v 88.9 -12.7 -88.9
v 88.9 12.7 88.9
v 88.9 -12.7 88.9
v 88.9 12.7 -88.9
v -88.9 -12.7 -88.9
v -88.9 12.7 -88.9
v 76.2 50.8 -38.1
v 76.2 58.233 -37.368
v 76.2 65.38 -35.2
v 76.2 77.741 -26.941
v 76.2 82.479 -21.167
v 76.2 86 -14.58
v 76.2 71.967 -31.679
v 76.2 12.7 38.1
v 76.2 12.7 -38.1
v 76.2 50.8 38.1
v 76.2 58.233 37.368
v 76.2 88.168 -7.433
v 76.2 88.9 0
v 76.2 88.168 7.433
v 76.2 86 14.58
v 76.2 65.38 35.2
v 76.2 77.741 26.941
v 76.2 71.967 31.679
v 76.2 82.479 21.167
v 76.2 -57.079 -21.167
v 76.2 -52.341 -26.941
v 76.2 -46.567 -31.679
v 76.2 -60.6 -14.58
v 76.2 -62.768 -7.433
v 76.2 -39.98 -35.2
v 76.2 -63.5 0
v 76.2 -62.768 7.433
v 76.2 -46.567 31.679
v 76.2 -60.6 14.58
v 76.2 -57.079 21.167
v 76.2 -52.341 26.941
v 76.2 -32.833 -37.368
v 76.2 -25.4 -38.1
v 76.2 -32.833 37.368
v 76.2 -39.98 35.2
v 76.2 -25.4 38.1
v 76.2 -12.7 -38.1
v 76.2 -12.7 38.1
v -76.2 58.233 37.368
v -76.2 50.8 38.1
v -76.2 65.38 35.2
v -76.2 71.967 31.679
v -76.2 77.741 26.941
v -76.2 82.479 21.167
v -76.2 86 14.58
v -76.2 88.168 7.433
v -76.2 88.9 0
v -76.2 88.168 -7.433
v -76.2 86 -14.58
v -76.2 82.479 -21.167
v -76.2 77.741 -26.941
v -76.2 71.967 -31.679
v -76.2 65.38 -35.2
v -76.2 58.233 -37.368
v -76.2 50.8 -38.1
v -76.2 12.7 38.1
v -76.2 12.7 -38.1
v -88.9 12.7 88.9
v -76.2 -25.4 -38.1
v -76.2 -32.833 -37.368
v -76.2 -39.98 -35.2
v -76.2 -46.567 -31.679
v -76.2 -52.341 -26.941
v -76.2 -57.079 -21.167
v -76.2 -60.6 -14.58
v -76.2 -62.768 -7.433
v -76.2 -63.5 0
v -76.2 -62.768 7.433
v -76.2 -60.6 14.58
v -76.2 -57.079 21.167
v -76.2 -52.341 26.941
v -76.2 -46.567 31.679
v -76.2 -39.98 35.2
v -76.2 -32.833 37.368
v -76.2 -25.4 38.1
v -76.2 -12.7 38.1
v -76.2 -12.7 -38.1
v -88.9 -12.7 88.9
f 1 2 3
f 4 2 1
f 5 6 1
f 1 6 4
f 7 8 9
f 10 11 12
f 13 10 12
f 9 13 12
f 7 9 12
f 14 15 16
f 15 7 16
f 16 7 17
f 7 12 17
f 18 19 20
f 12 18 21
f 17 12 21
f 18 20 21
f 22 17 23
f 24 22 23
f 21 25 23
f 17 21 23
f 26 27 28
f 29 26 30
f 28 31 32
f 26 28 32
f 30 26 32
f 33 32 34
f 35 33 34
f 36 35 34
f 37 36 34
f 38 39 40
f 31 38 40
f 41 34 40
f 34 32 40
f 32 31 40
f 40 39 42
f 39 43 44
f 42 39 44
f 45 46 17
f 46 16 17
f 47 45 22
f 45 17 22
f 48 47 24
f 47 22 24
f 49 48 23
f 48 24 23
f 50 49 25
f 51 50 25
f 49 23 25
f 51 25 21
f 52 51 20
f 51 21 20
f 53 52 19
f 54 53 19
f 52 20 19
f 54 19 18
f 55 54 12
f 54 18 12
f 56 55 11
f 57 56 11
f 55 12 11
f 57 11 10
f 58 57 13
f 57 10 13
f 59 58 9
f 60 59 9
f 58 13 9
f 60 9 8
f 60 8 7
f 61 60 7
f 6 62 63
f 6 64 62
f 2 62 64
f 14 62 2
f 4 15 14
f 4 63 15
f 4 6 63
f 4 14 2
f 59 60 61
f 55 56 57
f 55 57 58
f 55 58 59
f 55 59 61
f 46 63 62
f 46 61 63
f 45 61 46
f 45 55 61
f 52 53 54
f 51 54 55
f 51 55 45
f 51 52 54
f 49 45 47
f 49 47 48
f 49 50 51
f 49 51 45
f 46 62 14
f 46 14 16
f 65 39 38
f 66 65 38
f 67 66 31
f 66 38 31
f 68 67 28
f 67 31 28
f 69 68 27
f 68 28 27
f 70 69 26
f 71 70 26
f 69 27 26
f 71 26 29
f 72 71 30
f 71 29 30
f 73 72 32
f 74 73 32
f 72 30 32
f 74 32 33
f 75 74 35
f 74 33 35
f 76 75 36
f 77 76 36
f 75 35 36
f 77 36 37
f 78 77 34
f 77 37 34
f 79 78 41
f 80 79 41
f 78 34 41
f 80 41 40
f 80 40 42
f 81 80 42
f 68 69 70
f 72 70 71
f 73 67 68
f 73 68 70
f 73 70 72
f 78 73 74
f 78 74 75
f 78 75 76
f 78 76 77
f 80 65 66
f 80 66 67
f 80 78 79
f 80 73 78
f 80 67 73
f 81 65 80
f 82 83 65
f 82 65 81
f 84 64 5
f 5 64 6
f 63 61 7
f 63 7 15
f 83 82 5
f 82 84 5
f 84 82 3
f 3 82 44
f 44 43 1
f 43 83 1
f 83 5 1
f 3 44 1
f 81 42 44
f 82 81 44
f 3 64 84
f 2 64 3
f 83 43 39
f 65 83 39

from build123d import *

# Parameters (mm, degrees)
SKETCH1_W           = 177.8
SKETCH1_H           = 177.8
BOSS_EXTRUDE1_DEPTH = 12.7
BOSS_EXTRUDE2_DEPTH = 76.2


with BuildPart() as part:
    # Sketch1 → Boss-Extrude1 (new, symmetric)
    with BuildSketch(Plane(origin=(0, 0, 0), x_dir=(1, 0, 0), z_dir=(0, 1, 0))):
        Rectangle(SKETCH1_W, SKETCH1_H)
    extrude(amount=BOSS_EXTRUDE1_DEPTH, both=True)

    # Sketch2 → Boss-Extrude2 (add, symmetric)
    with BuildSketch(Plane(origin=(0, 0, 0), x_dir=(0, 0, -1), z_dir=(1, 0, 0))):
        with BuildLine():
            Line((-38.1, -25.4), (-38.1, 50.8))
            ThreePointArc((-38.1, 50.8), (0, 88.9), (38.1, 50.8))
            Line((38.1, 50.8), (38.1, -25.4))
            ThreePointArc((38.1, -25.4), (0, -63.5), (-38.1, -25.4))
        make_face()
    extrude(amount=BOSS_EXTRUDE2_DEPTH, both=True)


solid = part.part
